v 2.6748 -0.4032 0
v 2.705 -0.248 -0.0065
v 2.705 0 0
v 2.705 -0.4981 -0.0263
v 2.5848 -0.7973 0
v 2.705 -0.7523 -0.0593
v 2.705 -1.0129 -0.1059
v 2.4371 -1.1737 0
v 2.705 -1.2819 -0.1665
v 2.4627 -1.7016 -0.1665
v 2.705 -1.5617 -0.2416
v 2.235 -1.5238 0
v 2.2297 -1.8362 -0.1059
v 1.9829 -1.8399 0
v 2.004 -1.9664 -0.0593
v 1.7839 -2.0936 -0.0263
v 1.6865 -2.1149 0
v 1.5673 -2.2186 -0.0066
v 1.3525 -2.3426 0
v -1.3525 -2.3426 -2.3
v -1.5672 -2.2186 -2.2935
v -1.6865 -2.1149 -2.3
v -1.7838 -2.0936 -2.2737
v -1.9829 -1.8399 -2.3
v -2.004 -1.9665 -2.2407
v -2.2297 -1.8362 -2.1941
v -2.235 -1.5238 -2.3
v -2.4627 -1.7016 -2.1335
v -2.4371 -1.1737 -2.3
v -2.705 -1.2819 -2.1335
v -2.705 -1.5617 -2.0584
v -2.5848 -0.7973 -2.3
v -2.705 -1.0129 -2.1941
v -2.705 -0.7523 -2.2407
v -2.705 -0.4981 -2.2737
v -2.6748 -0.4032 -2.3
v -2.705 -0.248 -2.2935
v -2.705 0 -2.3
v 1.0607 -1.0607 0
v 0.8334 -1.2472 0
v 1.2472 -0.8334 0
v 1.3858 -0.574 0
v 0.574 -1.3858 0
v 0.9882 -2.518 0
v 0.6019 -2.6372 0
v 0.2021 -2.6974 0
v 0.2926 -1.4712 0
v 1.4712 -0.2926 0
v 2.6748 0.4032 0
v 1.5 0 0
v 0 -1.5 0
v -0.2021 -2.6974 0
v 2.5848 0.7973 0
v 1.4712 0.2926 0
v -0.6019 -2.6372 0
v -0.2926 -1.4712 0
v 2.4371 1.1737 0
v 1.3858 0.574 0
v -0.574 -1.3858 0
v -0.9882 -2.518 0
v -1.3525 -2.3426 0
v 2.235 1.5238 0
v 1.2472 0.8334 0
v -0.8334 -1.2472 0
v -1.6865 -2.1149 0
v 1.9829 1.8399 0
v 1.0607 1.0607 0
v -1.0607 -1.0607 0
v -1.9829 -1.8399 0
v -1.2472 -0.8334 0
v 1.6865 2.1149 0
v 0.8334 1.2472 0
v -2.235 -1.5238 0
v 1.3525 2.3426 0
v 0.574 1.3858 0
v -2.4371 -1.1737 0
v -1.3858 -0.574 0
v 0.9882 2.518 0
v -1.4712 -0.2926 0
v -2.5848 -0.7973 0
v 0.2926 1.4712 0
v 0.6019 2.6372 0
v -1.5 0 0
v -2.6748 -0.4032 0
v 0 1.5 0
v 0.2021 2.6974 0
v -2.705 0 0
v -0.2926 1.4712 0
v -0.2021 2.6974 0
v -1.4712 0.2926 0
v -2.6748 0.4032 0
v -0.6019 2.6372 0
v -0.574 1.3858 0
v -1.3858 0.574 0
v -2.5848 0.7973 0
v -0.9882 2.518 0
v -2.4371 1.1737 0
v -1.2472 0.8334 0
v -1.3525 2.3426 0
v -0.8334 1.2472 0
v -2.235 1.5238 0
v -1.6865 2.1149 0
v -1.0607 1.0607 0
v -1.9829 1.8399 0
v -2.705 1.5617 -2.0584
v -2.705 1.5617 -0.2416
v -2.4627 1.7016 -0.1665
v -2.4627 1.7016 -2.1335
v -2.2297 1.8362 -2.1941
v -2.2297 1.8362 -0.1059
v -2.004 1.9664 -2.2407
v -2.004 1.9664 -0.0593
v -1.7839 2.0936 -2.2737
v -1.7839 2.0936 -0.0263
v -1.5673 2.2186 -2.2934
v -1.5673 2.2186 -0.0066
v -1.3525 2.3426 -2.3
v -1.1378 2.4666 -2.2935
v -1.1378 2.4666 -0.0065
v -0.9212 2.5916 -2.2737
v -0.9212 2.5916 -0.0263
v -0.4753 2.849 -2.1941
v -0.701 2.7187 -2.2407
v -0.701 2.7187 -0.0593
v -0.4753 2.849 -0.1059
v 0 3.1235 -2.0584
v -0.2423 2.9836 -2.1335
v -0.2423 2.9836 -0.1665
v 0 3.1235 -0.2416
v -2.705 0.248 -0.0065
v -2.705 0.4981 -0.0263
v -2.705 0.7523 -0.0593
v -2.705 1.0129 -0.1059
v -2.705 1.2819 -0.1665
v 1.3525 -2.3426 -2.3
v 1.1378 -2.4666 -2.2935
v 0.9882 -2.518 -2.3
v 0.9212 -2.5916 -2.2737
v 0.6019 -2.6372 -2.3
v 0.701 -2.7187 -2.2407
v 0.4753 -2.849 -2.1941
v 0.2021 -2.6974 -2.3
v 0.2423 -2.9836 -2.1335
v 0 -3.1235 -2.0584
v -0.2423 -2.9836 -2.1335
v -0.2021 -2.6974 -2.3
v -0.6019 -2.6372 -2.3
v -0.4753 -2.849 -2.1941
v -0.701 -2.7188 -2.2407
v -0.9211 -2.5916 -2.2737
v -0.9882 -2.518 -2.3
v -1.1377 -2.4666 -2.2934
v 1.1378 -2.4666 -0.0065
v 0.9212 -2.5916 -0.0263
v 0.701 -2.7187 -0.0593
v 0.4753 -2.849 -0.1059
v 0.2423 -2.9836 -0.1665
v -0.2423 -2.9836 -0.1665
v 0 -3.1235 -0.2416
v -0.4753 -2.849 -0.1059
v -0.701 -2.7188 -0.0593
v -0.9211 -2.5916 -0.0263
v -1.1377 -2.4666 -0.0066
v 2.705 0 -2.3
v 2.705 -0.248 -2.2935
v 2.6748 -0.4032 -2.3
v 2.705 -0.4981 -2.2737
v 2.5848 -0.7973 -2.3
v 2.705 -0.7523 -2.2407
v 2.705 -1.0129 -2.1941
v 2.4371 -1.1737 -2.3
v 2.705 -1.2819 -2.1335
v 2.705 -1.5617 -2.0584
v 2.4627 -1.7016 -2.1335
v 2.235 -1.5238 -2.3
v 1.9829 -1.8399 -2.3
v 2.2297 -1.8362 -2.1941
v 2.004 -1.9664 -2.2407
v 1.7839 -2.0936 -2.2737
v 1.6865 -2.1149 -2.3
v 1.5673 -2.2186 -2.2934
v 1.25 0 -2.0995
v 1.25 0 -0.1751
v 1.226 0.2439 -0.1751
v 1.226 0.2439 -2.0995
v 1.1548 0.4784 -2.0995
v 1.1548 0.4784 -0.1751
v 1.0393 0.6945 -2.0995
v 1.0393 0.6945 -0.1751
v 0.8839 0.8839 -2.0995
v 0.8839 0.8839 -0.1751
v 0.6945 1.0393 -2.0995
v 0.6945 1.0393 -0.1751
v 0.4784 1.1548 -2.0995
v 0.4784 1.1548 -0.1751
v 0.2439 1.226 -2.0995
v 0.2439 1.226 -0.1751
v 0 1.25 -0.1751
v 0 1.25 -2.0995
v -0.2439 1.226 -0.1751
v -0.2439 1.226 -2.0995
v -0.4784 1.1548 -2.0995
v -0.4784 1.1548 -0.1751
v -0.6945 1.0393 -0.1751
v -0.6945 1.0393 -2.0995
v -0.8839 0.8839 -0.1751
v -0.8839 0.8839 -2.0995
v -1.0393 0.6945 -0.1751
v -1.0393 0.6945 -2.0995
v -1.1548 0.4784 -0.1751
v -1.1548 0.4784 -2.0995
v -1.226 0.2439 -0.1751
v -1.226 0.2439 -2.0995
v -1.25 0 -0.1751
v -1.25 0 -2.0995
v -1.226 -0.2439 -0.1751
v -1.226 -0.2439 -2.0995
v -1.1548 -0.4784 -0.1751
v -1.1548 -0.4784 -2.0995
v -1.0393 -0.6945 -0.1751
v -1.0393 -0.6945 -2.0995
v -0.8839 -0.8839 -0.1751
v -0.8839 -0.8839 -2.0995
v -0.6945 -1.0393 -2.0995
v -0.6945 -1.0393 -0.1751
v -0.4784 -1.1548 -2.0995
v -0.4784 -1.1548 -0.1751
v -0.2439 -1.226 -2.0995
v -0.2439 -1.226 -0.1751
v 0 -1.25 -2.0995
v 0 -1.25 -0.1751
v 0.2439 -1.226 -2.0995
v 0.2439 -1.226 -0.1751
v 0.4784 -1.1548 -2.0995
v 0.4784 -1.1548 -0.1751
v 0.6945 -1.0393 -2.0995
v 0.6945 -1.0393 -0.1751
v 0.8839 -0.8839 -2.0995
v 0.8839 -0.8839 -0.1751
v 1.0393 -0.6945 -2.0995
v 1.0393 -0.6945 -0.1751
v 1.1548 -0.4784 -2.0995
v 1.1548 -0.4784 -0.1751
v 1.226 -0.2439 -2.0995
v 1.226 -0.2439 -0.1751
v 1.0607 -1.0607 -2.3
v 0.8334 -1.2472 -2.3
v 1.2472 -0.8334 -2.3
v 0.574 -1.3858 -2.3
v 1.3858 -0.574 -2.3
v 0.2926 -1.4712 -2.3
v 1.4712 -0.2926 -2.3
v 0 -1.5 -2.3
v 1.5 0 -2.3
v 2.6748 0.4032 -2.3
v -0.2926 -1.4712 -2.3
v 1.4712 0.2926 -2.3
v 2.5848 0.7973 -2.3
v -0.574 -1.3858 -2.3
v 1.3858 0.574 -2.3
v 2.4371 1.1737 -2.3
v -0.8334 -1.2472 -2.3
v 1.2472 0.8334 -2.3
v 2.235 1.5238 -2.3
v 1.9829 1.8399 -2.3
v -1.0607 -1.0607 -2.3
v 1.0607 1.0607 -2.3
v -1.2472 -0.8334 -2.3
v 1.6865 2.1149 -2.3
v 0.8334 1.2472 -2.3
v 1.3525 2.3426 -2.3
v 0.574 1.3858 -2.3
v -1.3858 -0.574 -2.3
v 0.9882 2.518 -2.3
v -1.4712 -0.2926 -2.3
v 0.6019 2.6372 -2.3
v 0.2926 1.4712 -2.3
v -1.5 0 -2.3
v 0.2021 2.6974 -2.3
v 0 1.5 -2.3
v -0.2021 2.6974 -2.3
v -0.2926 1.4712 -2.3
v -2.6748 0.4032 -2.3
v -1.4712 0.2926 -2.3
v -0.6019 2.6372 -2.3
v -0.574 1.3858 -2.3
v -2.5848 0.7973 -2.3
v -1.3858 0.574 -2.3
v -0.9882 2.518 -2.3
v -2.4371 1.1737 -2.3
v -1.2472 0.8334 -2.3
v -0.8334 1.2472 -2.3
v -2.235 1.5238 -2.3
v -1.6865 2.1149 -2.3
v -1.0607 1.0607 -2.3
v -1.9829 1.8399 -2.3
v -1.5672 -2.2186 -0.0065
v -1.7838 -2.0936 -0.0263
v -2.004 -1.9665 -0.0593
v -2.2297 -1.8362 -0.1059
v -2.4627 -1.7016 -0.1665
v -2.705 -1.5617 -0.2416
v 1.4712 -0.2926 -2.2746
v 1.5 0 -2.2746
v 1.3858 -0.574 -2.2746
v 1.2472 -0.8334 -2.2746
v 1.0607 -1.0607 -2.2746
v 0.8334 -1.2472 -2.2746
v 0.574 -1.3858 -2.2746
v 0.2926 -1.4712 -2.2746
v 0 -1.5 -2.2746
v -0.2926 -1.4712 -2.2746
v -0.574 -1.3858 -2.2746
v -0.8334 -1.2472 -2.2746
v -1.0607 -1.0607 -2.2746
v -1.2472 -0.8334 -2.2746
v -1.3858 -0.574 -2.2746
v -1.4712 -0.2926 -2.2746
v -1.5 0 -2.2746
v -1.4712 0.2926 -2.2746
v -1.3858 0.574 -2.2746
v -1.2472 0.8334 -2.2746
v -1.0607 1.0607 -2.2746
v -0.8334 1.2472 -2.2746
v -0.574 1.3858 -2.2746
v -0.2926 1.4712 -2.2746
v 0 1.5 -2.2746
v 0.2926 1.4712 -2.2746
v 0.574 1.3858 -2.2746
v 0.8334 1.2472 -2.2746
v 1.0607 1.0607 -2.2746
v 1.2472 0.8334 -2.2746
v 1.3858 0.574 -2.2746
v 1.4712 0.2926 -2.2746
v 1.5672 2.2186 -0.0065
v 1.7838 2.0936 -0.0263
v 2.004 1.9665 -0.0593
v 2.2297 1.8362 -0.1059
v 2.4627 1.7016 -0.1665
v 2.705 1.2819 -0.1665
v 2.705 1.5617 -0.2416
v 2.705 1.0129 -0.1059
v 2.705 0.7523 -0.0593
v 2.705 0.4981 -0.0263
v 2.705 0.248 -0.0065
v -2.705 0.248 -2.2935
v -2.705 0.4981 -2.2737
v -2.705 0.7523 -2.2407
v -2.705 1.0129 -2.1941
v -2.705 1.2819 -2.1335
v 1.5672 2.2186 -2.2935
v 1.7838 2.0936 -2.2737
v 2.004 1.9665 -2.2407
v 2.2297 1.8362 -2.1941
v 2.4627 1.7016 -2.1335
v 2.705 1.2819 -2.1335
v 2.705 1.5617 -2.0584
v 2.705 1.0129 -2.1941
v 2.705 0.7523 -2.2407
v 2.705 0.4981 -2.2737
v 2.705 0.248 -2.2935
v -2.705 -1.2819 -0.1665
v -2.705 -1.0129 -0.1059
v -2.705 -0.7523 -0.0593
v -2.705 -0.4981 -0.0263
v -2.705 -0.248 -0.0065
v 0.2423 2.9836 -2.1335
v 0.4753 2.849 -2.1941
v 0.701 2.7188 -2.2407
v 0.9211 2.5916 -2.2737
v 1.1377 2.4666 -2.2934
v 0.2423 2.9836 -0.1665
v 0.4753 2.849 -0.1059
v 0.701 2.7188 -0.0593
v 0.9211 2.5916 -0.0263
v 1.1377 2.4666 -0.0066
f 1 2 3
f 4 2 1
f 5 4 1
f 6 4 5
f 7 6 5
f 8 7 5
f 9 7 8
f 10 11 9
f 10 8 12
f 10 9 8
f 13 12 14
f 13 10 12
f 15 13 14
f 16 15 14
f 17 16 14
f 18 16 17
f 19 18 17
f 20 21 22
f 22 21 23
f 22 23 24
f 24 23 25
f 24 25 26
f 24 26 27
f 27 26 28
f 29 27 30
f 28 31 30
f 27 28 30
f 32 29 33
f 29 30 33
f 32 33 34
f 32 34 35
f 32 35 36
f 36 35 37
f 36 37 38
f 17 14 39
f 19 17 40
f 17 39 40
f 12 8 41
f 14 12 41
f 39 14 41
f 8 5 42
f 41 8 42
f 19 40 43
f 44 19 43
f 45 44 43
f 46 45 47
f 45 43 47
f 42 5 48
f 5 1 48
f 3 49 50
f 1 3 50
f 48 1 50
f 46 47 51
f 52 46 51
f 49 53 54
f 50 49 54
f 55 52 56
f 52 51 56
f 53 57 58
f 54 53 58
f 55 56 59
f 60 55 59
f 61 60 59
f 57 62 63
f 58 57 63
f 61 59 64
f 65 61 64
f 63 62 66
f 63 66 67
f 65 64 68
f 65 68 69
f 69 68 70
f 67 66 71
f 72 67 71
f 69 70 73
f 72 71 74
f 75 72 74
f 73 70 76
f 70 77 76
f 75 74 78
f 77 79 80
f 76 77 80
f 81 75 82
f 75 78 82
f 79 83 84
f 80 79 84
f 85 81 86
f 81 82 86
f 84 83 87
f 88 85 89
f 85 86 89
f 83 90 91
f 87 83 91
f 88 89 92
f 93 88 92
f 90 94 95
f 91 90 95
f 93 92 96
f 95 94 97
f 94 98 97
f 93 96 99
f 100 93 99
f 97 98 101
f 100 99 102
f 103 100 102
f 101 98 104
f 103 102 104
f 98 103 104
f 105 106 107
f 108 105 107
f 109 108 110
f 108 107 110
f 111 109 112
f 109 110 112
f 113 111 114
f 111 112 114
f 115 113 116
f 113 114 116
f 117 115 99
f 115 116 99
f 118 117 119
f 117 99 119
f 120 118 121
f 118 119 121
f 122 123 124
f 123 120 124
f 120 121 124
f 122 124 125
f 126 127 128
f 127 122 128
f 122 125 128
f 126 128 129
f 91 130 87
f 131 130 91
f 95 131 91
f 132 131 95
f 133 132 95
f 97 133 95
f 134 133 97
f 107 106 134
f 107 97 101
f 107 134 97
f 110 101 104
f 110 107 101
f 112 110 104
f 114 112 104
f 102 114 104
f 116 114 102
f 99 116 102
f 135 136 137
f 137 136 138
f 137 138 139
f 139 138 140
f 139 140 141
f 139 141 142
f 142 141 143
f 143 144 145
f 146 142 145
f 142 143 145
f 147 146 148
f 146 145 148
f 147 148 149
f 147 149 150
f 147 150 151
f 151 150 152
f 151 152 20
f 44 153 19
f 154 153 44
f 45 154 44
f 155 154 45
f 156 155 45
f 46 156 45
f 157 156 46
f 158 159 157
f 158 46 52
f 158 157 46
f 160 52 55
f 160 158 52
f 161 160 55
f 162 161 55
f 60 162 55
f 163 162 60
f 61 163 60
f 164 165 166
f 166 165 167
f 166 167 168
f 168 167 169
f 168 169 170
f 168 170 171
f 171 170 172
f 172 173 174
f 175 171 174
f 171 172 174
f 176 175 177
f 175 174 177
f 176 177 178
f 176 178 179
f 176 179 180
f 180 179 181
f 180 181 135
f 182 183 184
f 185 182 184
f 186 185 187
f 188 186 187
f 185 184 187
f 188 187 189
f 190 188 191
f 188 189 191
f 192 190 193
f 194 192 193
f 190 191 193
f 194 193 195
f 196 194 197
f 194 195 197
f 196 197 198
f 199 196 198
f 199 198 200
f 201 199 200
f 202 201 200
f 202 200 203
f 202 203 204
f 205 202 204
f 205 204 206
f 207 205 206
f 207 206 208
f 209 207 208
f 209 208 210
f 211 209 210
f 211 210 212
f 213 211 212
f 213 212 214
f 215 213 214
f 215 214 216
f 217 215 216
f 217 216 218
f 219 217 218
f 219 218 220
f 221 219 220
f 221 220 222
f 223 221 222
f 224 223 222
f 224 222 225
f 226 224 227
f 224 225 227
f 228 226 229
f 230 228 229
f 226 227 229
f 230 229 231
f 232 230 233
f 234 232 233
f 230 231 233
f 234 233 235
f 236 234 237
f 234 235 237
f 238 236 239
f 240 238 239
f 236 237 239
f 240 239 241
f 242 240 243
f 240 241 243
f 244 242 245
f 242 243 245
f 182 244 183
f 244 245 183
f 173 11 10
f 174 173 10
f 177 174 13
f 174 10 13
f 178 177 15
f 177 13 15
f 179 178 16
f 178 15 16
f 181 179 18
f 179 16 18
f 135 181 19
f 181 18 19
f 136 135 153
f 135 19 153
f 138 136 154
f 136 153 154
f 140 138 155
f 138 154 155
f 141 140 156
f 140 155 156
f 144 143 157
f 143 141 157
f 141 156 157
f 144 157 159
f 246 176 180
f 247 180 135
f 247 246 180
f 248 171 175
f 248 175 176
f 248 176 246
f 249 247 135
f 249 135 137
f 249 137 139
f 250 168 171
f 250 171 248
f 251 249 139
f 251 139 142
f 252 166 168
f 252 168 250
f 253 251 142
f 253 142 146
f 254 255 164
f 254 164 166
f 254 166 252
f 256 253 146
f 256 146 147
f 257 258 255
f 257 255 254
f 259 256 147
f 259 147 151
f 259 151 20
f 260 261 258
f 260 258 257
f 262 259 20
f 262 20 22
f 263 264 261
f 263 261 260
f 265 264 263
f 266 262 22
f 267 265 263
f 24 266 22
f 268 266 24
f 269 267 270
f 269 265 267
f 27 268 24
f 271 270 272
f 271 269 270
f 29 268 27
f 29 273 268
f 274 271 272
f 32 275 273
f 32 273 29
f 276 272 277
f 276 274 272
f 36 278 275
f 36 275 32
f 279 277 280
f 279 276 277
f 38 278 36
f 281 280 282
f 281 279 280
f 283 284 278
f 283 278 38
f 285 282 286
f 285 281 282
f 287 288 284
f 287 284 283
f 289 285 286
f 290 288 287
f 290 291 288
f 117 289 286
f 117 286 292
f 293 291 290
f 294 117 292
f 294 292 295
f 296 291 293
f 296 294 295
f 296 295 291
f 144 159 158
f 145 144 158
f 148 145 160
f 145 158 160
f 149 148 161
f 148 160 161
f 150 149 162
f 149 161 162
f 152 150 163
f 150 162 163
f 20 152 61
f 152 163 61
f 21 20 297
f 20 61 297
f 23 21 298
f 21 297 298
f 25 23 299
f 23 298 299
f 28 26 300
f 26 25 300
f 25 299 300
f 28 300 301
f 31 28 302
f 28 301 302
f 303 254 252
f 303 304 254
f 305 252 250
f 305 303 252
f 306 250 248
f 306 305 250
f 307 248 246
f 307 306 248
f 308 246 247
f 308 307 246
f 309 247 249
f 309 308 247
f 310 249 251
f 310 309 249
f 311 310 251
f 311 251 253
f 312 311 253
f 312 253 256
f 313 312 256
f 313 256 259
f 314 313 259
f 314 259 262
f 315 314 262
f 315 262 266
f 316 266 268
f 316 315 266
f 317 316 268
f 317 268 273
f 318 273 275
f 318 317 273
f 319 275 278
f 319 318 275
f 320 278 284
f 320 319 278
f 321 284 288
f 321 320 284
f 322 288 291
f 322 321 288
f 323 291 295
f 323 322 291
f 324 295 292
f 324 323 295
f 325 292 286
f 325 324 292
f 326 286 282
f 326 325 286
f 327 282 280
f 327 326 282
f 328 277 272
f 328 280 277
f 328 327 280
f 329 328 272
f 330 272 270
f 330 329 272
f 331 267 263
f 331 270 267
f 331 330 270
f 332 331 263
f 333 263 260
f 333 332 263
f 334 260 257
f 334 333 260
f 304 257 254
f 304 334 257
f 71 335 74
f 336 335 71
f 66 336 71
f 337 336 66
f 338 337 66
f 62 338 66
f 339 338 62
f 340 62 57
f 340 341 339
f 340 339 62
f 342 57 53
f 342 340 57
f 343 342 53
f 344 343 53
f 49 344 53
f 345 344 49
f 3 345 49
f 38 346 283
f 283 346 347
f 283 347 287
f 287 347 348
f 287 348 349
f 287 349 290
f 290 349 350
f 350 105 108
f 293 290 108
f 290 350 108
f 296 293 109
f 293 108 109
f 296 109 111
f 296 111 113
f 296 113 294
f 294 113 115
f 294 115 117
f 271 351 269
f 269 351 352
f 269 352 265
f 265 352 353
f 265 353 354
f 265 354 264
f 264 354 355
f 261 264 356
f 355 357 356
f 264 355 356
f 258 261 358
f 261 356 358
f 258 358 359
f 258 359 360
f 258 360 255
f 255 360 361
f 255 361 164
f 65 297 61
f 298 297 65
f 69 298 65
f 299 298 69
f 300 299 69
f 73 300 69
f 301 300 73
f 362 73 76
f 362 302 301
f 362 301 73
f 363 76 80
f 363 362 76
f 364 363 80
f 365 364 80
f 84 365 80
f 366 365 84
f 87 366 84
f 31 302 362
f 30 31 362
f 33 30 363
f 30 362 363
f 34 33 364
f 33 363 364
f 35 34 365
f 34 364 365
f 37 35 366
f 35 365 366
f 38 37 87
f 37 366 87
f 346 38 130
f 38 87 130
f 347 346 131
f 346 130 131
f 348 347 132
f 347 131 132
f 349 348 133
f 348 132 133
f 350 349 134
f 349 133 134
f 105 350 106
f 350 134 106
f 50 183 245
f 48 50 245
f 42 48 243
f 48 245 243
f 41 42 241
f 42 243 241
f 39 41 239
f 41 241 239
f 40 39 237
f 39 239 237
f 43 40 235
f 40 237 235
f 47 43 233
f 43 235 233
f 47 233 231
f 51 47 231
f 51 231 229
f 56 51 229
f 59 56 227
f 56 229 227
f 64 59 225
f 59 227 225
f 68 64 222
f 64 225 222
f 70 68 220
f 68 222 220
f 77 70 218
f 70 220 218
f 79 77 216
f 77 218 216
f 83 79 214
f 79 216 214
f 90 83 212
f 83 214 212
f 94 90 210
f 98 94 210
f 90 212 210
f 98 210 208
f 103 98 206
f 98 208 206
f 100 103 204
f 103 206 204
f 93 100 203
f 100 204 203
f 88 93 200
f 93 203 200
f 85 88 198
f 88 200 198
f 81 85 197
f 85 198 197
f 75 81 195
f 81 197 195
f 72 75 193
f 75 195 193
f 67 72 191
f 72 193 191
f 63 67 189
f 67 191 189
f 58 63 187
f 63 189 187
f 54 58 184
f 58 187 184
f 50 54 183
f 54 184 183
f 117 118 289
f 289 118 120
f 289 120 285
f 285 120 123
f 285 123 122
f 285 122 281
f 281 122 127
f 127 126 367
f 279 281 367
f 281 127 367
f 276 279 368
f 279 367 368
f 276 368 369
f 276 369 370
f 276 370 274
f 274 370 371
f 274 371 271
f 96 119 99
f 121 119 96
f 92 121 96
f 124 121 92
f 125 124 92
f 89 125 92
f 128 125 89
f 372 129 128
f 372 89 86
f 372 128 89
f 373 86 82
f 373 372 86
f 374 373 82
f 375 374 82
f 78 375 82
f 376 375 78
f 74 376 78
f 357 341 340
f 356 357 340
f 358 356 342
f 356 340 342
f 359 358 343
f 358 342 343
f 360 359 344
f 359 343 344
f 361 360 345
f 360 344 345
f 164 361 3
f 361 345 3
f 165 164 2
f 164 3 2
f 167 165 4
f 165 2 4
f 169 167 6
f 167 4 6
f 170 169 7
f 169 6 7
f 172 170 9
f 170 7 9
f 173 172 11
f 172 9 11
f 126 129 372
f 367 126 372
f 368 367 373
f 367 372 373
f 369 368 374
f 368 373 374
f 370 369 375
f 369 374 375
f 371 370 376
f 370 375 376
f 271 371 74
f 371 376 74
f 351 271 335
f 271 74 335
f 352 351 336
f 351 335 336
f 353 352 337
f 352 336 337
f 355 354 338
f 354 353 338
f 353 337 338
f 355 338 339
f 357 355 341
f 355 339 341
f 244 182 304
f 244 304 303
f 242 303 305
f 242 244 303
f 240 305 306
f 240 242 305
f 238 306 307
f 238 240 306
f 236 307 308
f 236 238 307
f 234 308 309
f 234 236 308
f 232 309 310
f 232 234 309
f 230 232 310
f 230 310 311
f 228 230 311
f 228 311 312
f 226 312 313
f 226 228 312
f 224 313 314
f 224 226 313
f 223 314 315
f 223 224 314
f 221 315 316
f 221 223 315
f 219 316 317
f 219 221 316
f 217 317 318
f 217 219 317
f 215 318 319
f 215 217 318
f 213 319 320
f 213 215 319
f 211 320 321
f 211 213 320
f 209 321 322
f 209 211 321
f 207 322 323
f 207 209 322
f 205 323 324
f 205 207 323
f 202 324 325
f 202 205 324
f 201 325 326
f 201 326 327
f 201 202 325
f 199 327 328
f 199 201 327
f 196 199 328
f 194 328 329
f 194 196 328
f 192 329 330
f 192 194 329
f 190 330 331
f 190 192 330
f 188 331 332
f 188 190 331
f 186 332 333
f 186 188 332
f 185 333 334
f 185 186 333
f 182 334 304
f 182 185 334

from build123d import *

# Parameters (mm, degrees)
BASENUTSKE_R  = 1.25
BASENUT_DEPTH = 2.3


with BuildPart() as part:
    # BaseNutSke → BaseNut (new body)
    with BuildSketch(Plane.XY):
        Polygon((2.705, 1.561732478), (2.705, -1.561732478), (0, -3.123464956), (-2.705, -1.561732478), (-2.705, 1.561732478), (0, 3.123464956), align=None)
        Circle(BASENUTSKE_R, mode=Mode.SUBTRACT)
    extrude(amount=-BASENUT_DEPTH)

    # Sketch3 → Double-Chamfer (revolve, cut)
    with BuildSketch(Plane(origin=(0, 0, 0), x_dir=(0, 0, -1), z_dir=(1, 0, 0))):
        Polygon((2.3, 2.705), (2.058399145, 3.123464956), (2.058399145, 13.123464956), (12.3, 13.123464956), (12.3, 2.705), align=None)
        Polygon((0.241600855, 13.123464956), (-10, 13.123464956), (-10, 2.705), (0, 2.705), (0.241600855, 3.123464956), align=None)
    revolve(axis=Axis((0, 0, 0), (0, 0, -1)), mode=Mode.SUBTRACT)

    # Sketch5 (on Right Plane) → EndChamfer (revolve, cut)
    with BuildSketch(Plane(origin=(0, 0, 0), x_dir=(0, 0, -1), z_dir=(1, 0, 0)), mode=Mode.PRIVATE) as endchamfer_sk:
        Polygon((2.2746, 1.5), (2.082042927, 1.225), (2.3254, 1.225), (2.3254, 1.5), align=None)
        Polygon((-0.0508, 1.5), (0, 1.5), (0.192557073, 1.225), (-0.0508, 1.225), align=None)
    revolve(endchamfer_sk.sketch.rotate(Axis((0, 0, -25.037505729), (0, 0, -1)), 90), axis=Axis((0, 0, -25.037505729), (0, 0, -1)), mode=Mode.SUBTRACT)


solid = part.part
